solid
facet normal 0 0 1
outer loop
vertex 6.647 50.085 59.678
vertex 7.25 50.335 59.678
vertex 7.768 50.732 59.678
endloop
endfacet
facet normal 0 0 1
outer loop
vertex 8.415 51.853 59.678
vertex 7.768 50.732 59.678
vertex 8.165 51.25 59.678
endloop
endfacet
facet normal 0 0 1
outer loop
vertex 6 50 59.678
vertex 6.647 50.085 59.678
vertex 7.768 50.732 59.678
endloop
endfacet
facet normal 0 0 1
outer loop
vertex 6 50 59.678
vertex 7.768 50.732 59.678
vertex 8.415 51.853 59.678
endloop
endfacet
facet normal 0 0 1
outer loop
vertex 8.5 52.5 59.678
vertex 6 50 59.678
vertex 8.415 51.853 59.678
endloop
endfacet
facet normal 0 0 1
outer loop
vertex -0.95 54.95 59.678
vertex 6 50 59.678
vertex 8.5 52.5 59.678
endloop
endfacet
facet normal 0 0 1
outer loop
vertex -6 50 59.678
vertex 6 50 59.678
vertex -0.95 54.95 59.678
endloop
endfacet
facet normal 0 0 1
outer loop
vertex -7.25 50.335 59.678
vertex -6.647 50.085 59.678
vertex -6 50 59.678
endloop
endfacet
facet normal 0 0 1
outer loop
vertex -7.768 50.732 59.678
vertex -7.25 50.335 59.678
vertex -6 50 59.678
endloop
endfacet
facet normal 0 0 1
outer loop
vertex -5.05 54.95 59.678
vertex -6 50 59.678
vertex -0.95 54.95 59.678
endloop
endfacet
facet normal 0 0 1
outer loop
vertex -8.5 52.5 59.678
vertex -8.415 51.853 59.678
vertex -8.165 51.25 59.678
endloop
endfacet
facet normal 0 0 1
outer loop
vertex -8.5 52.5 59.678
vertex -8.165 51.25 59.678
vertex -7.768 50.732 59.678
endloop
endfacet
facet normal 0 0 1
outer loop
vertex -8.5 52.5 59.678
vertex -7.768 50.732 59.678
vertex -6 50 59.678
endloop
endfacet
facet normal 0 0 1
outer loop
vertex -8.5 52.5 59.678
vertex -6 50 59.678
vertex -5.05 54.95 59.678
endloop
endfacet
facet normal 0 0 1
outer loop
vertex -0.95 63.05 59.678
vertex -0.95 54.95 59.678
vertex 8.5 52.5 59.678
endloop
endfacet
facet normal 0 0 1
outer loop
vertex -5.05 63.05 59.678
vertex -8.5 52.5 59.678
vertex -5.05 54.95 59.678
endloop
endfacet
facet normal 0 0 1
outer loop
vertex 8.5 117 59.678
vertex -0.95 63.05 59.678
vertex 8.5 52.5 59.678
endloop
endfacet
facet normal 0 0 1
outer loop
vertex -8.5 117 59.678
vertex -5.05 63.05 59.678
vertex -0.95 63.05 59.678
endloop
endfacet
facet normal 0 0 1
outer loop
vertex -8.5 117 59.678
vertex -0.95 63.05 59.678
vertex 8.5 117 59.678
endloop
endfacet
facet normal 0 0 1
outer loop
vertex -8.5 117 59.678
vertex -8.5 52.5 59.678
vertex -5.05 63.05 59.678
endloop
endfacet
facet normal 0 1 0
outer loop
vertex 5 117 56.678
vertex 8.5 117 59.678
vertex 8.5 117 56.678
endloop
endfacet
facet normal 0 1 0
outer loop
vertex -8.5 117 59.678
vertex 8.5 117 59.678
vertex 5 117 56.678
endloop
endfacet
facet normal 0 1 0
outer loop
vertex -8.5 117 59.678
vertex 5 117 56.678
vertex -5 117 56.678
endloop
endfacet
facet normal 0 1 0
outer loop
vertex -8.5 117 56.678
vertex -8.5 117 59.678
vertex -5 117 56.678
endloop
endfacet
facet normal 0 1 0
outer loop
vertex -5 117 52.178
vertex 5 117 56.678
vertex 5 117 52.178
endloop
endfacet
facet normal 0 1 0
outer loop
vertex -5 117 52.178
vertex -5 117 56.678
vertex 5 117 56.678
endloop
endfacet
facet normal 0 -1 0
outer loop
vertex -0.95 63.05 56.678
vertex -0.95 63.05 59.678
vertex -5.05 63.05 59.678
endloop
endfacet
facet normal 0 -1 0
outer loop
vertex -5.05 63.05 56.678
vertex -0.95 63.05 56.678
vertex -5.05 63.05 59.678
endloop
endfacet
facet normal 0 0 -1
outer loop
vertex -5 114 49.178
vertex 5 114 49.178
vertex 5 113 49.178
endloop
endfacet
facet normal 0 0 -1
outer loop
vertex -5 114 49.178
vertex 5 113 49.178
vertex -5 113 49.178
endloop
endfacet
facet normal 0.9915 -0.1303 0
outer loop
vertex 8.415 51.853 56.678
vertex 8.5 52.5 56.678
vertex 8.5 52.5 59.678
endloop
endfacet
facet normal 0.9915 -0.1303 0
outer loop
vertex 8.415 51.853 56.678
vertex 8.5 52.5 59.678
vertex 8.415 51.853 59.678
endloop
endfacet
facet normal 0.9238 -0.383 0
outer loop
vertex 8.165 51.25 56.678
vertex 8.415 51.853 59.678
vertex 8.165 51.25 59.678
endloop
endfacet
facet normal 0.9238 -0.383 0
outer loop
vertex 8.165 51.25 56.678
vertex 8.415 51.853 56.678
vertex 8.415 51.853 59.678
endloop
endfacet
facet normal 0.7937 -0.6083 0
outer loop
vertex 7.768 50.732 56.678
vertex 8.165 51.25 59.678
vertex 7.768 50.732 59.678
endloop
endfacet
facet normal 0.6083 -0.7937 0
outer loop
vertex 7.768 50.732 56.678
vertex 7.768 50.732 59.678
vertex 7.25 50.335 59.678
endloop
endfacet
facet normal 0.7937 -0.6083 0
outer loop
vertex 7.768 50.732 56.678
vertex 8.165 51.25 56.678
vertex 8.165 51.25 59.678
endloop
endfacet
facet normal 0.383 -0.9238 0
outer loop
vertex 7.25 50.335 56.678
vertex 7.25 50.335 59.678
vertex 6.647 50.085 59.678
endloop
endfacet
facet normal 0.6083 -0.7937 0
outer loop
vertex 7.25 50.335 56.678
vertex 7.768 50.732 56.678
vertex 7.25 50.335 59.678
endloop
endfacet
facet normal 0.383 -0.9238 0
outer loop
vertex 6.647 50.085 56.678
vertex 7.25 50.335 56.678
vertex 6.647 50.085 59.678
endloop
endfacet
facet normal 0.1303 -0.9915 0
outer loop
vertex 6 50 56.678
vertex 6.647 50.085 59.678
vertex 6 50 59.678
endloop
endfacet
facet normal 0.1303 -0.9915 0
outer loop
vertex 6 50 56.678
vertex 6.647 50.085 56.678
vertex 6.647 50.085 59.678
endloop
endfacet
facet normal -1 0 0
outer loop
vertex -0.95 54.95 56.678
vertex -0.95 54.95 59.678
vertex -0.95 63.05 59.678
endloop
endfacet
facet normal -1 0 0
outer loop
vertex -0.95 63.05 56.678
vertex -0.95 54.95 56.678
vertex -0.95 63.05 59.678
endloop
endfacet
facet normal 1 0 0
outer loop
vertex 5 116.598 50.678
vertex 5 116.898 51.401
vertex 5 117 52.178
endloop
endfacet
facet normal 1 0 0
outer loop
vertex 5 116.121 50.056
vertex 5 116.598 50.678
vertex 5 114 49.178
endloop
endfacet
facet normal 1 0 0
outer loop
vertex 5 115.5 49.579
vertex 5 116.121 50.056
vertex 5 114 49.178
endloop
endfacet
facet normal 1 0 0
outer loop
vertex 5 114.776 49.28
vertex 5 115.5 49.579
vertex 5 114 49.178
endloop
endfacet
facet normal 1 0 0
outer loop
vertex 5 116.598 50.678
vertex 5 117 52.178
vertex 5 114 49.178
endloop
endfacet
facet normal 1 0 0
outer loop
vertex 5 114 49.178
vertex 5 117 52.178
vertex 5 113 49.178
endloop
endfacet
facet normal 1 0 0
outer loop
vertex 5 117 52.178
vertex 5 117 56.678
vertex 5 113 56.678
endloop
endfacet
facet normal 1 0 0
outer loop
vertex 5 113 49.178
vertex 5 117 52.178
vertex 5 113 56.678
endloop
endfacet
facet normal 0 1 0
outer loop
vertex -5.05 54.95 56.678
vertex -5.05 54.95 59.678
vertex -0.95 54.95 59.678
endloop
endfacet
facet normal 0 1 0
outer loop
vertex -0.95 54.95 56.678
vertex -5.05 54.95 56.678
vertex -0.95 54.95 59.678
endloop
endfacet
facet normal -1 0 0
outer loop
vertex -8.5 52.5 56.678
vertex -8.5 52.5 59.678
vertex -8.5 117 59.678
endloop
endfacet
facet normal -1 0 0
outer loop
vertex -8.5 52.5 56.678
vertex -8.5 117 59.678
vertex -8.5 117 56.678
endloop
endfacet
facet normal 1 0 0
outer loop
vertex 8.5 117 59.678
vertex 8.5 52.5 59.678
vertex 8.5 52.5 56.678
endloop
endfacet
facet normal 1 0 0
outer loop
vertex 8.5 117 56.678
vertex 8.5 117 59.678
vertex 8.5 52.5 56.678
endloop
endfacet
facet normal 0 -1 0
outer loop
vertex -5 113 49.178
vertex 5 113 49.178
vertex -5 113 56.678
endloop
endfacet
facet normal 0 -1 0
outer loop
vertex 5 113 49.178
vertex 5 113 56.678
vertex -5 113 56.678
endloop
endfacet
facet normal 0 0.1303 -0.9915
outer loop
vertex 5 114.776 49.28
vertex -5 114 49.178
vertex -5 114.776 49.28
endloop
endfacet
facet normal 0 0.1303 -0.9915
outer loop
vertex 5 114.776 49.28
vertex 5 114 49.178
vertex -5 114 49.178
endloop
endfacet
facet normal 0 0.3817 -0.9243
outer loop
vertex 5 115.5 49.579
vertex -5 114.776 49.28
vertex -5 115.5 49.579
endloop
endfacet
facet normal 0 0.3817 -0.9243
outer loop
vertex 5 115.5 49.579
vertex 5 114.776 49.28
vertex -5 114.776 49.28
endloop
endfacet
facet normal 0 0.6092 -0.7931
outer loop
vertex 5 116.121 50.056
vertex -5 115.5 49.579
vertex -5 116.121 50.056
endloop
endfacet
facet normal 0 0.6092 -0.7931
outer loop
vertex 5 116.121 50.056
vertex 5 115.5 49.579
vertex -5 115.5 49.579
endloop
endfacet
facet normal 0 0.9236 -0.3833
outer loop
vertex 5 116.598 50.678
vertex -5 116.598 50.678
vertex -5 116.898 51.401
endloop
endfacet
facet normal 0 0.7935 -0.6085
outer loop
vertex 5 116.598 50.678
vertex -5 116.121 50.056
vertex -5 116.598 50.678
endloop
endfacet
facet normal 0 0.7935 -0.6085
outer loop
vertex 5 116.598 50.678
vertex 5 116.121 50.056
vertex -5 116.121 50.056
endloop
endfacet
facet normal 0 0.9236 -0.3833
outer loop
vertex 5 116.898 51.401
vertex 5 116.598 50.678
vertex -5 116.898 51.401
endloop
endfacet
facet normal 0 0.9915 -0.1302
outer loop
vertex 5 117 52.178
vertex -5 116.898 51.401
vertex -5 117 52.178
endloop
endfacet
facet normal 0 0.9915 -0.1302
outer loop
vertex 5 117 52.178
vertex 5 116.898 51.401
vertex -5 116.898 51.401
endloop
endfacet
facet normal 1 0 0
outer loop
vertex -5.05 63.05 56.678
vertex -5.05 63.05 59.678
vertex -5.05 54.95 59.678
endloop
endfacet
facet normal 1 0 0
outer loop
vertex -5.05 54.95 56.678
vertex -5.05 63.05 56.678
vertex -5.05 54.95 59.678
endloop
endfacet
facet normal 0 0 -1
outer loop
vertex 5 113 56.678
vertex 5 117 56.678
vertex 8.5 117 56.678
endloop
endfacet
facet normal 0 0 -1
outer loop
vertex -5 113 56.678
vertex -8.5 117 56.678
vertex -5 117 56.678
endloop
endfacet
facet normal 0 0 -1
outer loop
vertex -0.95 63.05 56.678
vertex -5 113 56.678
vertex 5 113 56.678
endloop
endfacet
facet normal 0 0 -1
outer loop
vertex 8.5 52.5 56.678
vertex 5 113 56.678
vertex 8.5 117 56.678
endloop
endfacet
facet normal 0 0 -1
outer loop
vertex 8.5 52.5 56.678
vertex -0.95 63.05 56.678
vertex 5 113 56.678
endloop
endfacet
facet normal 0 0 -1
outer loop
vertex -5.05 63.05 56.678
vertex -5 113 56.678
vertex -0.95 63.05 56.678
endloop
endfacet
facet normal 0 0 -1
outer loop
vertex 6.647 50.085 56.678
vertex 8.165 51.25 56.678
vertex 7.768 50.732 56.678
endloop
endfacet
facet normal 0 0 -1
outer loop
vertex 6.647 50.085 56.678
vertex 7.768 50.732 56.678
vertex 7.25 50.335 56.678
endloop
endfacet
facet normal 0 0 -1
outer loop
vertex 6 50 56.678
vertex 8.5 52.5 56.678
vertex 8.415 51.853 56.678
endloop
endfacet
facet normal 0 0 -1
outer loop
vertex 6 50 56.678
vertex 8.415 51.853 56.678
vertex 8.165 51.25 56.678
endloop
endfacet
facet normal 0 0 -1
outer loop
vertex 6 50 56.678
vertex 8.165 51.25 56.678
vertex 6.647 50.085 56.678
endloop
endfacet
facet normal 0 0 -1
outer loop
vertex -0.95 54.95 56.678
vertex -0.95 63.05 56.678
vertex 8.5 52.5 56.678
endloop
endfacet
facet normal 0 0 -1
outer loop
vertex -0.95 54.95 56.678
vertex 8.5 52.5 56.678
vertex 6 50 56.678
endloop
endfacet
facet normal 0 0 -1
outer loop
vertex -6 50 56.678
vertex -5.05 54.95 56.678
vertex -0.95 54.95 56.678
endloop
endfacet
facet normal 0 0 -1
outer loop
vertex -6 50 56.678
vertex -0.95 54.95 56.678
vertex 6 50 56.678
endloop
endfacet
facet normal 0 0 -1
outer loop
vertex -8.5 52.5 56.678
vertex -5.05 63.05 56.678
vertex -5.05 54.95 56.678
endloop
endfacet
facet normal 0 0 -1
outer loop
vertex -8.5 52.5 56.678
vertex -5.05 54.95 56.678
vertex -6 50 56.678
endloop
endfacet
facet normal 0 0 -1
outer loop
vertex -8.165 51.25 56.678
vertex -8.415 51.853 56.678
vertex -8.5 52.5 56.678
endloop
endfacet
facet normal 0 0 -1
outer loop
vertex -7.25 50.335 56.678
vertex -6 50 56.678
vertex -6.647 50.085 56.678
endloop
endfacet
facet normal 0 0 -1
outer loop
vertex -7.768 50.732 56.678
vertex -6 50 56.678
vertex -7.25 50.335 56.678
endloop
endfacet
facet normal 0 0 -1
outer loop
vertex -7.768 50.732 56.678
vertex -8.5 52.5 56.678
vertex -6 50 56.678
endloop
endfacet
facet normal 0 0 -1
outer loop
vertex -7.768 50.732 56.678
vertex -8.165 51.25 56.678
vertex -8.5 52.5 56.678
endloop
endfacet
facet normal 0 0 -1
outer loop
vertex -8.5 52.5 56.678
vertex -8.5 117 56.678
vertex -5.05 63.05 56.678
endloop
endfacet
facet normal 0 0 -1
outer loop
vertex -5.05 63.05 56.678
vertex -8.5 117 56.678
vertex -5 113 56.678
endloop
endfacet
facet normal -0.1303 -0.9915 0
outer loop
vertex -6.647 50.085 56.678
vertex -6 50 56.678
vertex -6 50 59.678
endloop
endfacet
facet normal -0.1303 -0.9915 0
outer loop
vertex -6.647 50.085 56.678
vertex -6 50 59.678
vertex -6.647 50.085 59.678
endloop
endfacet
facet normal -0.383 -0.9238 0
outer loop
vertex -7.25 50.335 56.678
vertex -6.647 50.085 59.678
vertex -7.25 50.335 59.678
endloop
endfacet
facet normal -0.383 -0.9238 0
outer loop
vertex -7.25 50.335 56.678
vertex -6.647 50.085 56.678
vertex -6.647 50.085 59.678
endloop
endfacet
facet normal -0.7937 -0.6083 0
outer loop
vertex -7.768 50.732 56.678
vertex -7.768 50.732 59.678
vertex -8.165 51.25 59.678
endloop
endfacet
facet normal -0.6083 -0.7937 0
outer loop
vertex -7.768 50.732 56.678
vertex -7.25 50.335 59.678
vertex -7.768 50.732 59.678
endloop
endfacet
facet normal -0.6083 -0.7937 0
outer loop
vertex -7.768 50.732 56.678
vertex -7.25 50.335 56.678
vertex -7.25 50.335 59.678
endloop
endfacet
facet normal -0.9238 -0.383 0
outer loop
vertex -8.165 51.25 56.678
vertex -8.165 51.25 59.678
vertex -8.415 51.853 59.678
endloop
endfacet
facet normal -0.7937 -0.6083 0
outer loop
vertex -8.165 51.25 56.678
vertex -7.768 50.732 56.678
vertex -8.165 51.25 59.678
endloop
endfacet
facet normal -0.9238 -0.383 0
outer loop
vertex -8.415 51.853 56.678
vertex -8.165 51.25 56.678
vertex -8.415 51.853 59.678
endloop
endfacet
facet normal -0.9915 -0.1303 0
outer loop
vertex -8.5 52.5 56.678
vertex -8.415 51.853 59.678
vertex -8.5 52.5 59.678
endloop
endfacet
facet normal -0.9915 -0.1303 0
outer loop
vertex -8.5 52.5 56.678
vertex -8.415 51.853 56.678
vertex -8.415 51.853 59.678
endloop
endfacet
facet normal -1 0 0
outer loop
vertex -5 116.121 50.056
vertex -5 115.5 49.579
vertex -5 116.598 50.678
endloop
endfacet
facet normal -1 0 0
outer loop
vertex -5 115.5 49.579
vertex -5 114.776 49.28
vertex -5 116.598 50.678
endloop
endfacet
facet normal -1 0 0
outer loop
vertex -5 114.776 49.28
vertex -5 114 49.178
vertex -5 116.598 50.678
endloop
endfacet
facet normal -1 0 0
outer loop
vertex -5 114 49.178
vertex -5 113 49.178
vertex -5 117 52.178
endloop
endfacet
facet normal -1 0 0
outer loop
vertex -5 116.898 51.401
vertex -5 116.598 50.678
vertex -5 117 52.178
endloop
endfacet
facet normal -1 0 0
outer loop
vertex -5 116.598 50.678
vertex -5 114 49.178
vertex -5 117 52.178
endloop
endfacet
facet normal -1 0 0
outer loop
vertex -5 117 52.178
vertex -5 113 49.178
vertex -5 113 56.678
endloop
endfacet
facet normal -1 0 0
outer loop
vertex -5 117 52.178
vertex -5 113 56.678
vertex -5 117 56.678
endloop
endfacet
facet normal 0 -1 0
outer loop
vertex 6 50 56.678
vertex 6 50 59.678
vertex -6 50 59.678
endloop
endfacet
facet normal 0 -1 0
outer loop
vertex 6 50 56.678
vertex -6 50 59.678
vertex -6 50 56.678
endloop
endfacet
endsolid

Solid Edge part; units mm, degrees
sketch "Sketch1" plane through (0, 0, 0) normal (1, 0, 0) x (0, 1, 0)
  line L0 (50, 59.6775) -> (117, 59.6775)
  line L1 (117, 59.6775) -> (117, 56.6775)
  line L2 (117, 56.6775) -> (50, 56.6775)
  line L3 (50, 59.6775) -> (50, 56.6775)
extrude "Protrusion1" add sketch "Sketch1" along normal mid plane 17
sketch "Sketch2" plane through (0, 84.5, 56.6775) normal (0, 0, -1) x (-1, 0, 0)
  line L0 (5, 28.5) -> (5, 32.5)
  line L1 (5, 32.5) -> (-5, 32.5)
  line L2 (-5, 32.5) -> (-5, 28.5)
  line L3 (-5, 28.5) -> (5, 28.5)
extrude "ExtrudedProtrusion_2" add sketch "Sketch2" along normal blind 7.5
fillet "Round_1" radius 3 1 edges at (0, 117, 49.1775)
fillet "Round_2" radius 2.5 2 edges at (-8.5, 50, 58.1775) (8.5, 50, 58.1775)
sketch "Sketch3" plane through (0, 84.5, 59.6775) normal (0, 0, 1) x (0, 1, 0)
  line L0 (-29.55, 0.95) -> (-21.45, 0.95)
  line L1 (-21.45, 0.95) -> (-21.45, 5.05)
  line L2 (-21.45, 5.05) -> (-29.55, 5.05)
  line L3 (-29.55, 5.05) -> (-29.55, 0.95)
extrude "Cutout1" cut sketch "Sketch3" against normal up to next
